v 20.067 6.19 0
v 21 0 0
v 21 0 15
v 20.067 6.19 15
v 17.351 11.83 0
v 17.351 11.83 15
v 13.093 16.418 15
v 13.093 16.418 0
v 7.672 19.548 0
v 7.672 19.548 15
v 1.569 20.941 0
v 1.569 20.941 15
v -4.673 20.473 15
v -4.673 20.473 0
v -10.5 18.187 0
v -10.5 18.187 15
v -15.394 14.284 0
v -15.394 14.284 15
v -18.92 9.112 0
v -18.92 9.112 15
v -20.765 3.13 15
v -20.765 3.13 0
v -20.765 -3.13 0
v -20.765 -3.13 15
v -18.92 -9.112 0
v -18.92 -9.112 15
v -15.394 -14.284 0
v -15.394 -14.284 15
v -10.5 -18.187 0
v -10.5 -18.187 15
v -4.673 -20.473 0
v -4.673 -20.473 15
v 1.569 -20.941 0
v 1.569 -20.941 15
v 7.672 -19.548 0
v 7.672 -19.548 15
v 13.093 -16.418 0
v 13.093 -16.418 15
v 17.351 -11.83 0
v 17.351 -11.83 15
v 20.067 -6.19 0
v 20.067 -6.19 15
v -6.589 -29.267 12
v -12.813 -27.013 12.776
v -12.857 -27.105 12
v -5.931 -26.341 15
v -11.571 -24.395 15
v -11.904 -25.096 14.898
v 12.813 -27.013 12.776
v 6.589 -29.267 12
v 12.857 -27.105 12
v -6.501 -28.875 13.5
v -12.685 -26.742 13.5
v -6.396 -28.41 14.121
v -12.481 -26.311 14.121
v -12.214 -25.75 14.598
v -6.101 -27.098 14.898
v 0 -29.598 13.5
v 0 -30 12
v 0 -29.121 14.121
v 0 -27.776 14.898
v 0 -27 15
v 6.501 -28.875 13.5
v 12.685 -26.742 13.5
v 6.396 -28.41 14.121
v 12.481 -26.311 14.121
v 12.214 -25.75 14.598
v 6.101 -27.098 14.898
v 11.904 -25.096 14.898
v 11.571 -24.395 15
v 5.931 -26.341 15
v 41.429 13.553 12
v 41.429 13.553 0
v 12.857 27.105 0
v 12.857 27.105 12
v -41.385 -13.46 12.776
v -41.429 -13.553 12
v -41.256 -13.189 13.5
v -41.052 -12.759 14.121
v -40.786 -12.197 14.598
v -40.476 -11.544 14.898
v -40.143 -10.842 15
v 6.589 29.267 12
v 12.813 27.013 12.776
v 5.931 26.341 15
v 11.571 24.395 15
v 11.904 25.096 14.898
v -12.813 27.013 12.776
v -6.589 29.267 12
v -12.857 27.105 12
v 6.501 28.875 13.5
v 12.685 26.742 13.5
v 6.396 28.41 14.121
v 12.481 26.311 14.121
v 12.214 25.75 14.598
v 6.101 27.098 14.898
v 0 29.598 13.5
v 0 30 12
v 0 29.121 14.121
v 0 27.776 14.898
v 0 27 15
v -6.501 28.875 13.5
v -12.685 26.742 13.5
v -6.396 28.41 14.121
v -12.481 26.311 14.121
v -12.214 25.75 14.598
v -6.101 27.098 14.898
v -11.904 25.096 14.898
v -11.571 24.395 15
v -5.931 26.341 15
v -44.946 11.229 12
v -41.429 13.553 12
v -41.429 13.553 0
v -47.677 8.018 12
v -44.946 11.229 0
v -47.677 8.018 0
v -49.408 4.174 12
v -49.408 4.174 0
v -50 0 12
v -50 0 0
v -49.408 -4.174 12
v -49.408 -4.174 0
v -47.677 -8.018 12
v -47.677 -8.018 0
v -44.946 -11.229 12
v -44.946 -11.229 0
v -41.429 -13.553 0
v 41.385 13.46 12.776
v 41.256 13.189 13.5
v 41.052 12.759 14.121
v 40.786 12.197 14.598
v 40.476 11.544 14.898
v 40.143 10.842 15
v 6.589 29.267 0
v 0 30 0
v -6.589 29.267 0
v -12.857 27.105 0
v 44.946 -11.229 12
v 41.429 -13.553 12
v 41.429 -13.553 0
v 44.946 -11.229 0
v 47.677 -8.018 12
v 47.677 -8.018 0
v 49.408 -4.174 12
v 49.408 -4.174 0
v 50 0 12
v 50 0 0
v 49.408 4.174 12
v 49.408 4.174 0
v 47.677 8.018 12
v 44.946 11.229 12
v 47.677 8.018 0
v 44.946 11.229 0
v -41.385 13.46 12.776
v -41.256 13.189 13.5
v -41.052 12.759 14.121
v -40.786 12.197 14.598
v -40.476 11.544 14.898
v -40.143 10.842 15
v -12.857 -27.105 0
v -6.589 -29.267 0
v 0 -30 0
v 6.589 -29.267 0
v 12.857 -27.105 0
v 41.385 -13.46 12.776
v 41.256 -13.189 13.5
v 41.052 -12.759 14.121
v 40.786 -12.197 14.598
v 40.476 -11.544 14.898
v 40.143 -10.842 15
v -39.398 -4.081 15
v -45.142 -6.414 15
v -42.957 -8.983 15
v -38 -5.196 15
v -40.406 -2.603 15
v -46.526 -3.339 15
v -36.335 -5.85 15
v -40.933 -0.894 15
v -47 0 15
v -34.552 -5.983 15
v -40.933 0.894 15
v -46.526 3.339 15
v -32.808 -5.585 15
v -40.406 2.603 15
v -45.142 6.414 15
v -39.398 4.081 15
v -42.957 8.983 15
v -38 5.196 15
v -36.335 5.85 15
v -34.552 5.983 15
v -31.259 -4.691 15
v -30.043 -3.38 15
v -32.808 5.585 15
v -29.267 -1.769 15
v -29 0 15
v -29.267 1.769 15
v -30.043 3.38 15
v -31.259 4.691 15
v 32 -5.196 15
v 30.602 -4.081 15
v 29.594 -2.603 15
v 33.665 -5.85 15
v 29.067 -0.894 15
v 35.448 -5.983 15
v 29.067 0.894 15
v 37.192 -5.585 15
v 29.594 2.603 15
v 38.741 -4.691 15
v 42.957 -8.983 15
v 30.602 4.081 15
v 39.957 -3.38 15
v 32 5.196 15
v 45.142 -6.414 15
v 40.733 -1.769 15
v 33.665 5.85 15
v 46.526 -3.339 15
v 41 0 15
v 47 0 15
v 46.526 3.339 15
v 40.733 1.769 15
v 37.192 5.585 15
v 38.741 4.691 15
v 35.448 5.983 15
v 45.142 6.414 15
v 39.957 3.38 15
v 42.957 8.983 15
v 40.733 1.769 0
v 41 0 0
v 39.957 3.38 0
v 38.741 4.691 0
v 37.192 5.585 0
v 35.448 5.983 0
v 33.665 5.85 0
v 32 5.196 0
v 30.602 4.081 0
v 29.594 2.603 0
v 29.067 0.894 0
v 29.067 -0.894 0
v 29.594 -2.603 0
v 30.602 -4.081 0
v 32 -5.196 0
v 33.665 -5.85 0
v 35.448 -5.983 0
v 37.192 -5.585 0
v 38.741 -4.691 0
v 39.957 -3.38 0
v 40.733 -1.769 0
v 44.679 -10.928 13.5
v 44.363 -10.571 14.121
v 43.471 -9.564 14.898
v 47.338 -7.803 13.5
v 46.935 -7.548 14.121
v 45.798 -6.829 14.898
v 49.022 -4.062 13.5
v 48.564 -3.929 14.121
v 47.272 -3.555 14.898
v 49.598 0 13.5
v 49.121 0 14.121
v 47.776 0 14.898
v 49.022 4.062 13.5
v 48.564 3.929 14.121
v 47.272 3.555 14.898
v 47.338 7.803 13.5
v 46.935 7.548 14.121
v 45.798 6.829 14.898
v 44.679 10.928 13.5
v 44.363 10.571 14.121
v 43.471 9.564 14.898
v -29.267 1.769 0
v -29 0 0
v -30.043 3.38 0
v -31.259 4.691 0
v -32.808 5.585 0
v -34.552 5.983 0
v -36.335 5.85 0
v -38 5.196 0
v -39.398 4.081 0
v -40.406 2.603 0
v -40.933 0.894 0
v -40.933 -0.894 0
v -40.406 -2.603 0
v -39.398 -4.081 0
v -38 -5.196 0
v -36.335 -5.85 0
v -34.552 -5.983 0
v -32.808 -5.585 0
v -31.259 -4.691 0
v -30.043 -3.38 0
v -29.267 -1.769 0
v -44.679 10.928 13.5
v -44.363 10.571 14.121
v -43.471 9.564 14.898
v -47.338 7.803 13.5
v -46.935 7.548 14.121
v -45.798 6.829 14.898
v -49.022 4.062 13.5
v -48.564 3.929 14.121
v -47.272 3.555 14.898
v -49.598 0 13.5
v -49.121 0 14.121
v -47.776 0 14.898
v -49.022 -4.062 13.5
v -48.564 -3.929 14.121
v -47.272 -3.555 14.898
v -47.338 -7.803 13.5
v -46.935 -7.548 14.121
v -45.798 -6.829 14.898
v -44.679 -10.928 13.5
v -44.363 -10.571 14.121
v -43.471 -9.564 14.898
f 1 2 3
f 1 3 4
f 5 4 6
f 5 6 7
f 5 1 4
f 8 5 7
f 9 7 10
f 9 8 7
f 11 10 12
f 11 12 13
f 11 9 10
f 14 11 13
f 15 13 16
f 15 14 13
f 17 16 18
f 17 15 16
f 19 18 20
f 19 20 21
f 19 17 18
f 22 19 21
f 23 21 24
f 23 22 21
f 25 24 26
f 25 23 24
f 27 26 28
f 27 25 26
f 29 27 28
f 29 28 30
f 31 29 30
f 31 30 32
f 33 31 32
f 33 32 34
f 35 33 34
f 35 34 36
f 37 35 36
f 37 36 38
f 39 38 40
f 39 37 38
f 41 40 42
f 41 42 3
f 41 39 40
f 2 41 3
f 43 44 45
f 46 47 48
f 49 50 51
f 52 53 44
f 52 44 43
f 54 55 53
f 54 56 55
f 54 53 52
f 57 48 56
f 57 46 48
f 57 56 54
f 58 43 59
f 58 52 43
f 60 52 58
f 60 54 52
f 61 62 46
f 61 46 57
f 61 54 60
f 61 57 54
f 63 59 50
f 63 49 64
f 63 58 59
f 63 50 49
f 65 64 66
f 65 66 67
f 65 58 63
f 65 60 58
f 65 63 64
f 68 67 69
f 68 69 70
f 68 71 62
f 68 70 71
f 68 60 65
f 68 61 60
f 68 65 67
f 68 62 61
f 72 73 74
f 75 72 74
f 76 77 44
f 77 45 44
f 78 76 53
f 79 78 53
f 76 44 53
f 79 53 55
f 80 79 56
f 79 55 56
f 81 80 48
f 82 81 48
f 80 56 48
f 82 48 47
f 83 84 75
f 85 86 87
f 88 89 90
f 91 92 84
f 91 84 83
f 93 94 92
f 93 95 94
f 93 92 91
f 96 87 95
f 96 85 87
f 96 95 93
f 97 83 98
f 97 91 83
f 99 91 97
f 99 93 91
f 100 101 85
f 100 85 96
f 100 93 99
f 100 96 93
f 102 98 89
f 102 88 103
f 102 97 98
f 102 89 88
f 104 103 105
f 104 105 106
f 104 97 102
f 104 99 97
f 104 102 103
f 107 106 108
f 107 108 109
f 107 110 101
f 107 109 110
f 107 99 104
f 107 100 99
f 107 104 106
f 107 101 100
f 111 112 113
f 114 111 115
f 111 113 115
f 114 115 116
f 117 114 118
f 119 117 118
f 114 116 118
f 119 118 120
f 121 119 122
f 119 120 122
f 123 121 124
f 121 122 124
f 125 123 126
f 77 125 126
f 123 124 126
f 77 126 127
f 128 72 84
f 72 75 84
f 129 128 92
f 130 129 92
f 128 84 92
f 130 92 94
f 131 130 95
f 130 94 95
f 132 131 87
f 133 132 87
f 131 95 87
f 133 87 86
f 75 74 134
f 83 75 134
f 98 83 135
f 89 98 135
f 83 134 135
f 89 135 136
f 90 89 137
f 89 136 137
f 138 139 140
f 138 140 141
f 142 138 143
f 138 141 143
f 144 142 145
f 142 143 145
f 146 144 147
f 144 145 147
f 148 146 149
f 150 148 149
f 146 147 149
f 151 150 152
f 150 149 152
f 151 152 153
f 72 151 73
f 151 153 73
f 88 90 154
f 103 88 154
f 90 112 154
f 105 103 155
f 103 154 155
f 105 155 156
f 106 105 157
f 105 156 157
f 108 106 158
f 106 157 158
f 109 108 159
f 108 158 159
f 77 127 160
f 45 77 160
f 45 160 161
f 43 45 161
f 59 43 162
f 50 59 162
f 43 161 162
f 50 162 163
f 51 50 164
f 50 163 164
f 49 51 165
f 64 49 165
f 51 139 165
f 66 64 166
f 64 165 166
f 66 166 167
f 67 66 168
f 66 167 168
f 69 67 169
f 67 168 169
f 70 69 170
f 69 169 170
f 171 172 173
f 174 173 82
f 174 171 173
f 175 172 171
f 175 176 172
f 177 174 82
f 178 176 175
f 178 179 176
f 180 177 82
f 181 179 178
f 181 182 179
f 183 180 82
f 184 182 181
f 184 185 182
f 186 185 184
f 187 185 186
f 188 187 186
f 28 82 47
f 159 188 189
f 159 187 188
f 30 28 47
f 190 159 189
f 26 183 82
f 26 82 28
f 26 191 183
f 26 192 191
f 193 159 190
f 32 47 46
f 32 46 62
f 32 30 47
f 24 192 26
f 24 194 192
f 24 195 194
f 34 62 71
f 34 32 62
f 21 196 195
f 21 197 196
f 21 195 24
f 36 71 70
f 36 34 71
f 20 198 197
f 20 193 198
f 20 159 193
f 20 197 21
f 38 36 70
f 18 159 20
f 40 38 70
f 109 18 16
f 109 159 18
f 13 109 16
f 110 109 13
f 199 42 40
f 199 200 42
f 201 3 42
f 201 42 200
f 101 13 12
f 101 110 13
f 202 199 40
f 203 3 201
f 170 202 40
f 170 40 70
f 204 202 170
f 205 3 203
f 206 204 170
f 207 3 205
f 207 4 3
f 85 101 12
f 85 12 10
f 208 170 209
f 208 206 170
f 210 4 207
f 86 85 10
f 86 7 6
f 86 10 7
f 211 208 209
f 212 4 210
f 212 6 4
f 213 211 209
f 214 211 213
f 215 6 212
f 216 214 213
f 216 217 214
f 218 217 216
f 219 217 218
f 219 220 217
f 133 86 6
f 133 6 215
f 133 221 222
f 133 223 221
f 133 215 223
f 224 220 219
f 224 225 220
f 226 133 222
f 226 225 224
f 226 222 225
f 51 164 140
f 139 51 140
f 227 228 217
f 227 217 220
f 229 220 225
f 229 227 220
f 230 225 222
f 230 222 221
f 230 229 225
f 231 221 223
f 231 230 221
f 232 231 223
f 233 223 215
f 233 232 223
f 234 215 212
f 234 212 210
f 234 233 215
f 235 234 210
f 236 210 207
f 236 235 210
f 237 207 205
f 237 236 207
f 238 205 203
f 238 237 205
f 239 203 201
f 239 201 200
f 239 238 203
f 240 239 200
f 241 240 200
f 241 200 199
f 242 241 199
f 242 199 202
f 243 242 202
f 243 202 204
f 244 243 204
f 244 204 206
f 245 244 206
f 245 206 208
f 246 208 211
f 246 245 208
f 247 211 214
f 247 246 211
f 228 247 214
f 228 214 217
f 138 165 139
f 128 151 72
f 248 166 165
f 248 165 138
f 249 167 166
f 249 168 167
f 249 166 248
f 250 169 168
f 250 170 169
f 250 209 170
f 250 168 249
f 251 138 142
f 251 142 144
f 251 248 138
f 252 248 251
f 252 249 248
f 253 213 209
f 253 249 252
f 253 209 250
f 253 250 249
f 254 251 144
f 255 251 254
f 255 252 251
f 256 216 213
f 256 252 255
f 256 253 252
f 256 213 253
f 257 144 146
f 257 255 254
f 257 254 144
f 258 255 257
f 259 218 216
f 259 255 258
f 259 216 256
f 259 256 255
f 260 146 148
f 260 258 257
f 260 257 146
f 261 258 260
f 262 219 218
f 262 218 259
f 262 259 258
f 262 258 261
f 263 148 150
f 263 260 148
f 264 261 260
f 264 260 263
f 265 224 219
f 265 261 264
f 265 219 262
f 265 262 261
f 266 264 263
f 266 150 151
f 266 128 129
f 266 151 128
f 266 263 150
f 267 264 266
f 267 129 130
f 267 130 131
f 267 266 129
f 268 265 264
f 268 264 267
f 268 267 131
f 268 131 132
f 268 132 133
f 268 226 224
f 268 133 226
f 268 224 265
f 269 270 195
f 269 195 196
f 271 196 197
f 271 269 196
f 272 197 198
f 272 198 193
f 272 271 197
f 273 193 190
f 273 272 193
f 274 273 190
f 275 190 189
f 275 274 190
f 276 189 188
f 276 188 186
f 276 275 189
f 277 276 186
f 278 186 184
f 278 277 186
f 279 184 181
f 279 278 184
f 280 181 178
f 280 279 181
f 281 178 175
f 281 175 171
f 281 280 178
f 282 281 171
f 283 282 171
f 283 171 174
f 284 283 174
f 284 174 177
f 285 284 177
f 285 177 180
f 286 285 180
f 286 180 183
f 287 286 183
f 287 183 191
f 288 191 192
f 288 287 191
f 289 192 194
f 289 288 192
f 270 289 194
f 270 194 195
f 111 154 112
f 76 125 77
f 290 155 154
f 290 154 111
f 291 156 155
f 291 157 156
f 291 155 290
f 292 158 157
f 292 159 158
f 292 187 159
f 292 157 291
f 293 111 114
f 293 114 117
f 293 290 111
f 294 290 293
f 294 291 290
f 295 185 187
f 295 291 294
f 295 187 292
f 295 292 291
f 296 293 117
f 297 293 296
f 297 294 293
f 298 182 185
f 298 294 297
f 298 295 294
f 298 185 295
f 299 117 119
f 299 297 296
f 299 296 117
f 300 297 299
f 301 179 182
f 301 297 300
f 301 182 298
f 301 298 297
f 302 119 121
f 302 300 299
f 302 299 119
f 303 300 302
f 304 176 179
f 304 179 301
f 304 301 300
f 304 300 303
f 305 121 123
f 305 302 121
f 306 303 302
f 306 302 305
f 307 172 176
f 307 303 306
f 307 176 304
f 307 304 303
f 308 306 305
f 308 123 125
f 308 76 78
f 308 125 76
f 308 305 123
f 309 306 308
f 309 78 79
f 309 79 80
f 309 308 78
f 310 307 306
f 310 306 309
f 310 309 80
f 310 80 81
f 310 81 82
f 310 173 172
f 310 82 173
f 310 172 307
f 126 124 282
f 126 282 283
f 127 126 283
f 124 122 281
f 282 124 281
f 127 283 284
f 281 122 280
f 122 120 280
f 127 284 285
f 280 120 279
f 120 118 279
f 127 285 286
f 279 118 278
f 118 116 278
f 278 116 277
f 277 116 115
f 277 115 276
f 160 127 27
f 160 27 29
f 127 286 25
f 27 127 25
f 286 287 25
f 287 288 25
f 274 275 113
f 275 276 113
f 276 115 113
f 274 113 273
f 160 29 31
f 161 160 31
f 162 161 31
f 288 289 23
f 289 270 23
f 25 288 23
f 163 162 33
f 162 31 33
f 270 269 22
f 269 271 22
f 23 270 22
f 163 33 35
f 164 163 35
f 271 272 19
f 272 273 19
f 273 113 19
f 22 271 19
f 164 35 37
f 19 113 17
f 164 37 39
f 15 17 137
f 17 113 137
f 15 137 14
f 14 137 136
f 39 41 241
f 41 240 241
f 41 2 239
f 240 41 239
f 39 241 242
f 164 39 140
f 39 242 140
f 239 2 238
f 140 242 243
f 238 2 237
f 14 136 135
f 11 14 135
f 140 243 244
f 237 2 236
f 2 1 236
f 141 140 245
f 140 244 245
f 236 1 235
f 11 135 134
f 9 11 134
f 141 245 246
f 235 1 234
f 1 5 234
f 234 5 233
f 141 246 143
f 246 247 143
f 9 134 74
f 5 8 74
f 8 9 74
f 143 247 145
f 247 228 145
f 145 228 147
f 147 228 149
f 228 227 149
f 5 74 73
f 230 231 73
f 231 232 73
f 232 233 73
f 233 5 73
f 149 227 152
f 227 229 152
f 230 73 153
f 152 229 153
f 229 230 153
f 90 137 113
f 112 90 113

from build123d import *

# Parameters (mm, degrees)
F0_R     = 21
F0_R_2   = 6
F1_DEPTH = 15
F2_R     = 3


with BuildPart() as f1:
    # F0 (on Top) → F1 (new body)
    with BuildSketch(Plane.XY):
        with BuildLine():
            Line((12.857143, -27.105237), (41.428571, -13.552619))
            ThreePointArc((41.428571, -13.552619), (50, 0), (41.428571, 13.552619))
            Line((41.428571, 13.552619), (12.857143, 27.105237))
            ThreePointArc((12.857143, 27.105237), (0, 30), (-12.857143, 27.105237))
            Line((-12.857143, 27.105237), (-41.428571, 13.552619))
            ThreePointArc((-41.428571, 13.552619), (-50, 0), (-41.428571, -13.552619))
            Line((-41.428571, -13.552619), (-12.857143, -27.105237))
            ThreePointArc((-12.857143, -27.105237), (0, -30), (12.857143, -27.105237))
        make_face()
        Circle(F0_R, mode=Mode.SUBTRACT)
        with Locations((-35, 0)):
            Circle(F0_R_2, mode=Mode.SUBTRACT)
        with Locations((35, 0)):
            Circle(F0_R_2, mode=Mode.SUBTRACT)
    extrude(amount=F1_DEPTH)

    # F2
    f2_edges = [f1.edges().sort_by_distance(p)[0] for p in [
        (-27.142857, -20.328928, 15),
        (-50, 0, 15),
        (-27.142857, 20.328928, 15),
        (0, 30, 15),
        (27.142857, 20.328928, 15),
        (50, 0, 15),
        (27.142857, -20.328928, 15),
        (0, -30, 15),
    ]]
    fillet(f2_edges, radius=F2_R)


solid = f1.part
